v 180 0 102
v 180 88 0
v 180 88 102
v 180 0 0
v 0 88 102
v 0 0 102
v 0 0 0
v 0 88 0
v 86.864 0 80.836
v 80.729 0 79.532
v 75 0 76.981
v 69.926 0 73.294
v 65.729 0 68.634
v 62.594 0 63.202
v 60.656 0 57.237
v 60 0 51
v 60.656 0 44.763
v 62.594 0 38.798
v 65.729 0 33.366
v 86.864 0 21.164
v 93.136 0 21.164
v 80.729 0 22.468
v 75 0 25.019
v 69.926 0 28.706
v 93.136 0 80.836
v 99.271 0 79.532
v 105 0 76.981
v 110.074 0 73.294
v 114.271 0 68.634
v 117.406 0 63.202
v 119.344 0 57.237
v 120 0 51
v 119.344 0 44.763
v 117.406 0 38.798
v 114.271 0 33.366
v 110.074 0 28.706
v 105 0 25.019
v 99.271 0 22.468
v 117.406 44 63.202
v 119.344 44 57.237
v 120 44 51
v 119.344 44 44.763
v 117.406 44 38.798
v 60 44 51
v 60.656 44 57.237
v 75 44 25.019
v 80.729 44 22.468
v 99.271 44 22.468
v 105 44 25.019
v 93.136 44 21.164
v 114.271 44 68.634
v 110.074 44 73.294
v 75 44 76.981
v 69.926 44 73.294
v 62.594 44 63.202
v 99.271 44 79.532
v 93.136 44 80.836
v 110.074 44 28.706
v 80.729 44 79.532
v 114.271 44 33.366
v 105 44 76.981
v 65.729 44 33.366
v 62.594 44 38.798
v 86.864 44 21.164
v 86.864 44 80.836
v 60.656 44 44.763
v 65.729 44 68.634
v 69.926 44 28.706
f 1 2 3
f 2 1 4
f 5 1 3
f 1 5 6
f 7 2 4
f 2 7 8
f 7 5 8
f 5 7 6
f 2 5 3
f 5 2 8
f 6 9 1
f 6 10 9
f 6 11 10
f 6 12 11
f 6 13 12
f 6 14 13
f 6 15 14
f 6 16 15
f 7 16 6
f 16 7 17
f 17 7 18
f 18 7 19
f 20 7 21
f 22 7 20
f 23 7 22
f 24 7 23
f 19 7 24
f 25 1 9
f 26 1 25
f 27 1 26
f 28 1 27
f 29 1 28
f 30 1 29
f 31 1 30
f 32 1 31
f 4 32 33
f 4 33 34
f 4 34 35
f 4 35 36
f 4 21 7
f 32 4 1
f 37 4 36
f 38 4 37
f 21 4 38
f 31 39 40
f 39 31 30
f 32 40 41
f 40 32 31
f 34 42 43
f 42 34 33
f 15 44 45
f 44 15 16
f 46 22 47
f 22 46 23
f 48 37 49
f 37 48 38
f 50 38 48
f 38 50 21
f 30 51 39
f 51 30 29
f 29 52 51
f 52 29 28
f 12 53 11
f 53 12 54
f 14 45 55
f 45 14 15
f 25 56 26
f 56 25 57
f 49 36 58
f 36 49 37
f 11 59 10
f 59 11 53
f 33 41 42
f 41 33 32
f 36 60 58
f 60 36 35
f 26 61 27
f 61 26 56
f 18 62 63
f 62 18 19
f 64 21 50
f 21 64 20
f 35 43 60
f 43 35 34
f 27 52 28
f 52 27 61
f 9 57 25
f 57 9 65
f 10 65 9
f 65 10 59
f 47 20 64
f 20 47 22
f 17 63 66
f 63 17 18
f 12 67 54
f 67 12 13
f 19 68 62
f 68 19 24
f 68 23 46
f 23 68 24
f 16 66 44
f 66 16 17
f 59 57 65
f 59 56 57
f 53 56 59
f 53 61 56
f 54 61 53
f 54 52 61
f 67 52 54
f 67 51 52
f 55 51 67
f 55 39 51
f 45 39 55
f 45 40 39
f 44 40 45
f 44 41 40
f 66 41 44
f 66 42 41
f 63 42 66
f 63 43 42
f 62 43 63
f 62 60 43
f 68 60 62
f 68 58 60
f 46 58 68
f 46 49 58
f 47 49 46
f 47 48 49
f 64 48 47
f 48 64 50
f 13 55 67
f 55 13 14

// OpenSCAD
//Busek BIT-3
//1.6U ultra-lightweight structural chassis
//datasheet http://www.busek.com/index_htm_files/70010819F.pdf

//parameters
bit3_x = 180;
bit3_y = 88;
bit3_z = 102;
bit3_thruster_radius = 30;

difference(){
    //envelope of BIT-3
    cube([bit3_x,bit3_y,bit3_z]);
    //thruster appears to be centered and 1/3 of the width
    translate(v = [bit3_x/2, bit3_y/2, bit3_z/2]) //centered in x and z
    {
    rotate([90,0,0]) //rotate thruster subtraction cylinder
    cylinder(bit3_y, (bit3_thruster_radius), (bit3_thruster_radius), false); 
        //cylinder is: height, radius top, radius bottom, centered?
    }
   
};
